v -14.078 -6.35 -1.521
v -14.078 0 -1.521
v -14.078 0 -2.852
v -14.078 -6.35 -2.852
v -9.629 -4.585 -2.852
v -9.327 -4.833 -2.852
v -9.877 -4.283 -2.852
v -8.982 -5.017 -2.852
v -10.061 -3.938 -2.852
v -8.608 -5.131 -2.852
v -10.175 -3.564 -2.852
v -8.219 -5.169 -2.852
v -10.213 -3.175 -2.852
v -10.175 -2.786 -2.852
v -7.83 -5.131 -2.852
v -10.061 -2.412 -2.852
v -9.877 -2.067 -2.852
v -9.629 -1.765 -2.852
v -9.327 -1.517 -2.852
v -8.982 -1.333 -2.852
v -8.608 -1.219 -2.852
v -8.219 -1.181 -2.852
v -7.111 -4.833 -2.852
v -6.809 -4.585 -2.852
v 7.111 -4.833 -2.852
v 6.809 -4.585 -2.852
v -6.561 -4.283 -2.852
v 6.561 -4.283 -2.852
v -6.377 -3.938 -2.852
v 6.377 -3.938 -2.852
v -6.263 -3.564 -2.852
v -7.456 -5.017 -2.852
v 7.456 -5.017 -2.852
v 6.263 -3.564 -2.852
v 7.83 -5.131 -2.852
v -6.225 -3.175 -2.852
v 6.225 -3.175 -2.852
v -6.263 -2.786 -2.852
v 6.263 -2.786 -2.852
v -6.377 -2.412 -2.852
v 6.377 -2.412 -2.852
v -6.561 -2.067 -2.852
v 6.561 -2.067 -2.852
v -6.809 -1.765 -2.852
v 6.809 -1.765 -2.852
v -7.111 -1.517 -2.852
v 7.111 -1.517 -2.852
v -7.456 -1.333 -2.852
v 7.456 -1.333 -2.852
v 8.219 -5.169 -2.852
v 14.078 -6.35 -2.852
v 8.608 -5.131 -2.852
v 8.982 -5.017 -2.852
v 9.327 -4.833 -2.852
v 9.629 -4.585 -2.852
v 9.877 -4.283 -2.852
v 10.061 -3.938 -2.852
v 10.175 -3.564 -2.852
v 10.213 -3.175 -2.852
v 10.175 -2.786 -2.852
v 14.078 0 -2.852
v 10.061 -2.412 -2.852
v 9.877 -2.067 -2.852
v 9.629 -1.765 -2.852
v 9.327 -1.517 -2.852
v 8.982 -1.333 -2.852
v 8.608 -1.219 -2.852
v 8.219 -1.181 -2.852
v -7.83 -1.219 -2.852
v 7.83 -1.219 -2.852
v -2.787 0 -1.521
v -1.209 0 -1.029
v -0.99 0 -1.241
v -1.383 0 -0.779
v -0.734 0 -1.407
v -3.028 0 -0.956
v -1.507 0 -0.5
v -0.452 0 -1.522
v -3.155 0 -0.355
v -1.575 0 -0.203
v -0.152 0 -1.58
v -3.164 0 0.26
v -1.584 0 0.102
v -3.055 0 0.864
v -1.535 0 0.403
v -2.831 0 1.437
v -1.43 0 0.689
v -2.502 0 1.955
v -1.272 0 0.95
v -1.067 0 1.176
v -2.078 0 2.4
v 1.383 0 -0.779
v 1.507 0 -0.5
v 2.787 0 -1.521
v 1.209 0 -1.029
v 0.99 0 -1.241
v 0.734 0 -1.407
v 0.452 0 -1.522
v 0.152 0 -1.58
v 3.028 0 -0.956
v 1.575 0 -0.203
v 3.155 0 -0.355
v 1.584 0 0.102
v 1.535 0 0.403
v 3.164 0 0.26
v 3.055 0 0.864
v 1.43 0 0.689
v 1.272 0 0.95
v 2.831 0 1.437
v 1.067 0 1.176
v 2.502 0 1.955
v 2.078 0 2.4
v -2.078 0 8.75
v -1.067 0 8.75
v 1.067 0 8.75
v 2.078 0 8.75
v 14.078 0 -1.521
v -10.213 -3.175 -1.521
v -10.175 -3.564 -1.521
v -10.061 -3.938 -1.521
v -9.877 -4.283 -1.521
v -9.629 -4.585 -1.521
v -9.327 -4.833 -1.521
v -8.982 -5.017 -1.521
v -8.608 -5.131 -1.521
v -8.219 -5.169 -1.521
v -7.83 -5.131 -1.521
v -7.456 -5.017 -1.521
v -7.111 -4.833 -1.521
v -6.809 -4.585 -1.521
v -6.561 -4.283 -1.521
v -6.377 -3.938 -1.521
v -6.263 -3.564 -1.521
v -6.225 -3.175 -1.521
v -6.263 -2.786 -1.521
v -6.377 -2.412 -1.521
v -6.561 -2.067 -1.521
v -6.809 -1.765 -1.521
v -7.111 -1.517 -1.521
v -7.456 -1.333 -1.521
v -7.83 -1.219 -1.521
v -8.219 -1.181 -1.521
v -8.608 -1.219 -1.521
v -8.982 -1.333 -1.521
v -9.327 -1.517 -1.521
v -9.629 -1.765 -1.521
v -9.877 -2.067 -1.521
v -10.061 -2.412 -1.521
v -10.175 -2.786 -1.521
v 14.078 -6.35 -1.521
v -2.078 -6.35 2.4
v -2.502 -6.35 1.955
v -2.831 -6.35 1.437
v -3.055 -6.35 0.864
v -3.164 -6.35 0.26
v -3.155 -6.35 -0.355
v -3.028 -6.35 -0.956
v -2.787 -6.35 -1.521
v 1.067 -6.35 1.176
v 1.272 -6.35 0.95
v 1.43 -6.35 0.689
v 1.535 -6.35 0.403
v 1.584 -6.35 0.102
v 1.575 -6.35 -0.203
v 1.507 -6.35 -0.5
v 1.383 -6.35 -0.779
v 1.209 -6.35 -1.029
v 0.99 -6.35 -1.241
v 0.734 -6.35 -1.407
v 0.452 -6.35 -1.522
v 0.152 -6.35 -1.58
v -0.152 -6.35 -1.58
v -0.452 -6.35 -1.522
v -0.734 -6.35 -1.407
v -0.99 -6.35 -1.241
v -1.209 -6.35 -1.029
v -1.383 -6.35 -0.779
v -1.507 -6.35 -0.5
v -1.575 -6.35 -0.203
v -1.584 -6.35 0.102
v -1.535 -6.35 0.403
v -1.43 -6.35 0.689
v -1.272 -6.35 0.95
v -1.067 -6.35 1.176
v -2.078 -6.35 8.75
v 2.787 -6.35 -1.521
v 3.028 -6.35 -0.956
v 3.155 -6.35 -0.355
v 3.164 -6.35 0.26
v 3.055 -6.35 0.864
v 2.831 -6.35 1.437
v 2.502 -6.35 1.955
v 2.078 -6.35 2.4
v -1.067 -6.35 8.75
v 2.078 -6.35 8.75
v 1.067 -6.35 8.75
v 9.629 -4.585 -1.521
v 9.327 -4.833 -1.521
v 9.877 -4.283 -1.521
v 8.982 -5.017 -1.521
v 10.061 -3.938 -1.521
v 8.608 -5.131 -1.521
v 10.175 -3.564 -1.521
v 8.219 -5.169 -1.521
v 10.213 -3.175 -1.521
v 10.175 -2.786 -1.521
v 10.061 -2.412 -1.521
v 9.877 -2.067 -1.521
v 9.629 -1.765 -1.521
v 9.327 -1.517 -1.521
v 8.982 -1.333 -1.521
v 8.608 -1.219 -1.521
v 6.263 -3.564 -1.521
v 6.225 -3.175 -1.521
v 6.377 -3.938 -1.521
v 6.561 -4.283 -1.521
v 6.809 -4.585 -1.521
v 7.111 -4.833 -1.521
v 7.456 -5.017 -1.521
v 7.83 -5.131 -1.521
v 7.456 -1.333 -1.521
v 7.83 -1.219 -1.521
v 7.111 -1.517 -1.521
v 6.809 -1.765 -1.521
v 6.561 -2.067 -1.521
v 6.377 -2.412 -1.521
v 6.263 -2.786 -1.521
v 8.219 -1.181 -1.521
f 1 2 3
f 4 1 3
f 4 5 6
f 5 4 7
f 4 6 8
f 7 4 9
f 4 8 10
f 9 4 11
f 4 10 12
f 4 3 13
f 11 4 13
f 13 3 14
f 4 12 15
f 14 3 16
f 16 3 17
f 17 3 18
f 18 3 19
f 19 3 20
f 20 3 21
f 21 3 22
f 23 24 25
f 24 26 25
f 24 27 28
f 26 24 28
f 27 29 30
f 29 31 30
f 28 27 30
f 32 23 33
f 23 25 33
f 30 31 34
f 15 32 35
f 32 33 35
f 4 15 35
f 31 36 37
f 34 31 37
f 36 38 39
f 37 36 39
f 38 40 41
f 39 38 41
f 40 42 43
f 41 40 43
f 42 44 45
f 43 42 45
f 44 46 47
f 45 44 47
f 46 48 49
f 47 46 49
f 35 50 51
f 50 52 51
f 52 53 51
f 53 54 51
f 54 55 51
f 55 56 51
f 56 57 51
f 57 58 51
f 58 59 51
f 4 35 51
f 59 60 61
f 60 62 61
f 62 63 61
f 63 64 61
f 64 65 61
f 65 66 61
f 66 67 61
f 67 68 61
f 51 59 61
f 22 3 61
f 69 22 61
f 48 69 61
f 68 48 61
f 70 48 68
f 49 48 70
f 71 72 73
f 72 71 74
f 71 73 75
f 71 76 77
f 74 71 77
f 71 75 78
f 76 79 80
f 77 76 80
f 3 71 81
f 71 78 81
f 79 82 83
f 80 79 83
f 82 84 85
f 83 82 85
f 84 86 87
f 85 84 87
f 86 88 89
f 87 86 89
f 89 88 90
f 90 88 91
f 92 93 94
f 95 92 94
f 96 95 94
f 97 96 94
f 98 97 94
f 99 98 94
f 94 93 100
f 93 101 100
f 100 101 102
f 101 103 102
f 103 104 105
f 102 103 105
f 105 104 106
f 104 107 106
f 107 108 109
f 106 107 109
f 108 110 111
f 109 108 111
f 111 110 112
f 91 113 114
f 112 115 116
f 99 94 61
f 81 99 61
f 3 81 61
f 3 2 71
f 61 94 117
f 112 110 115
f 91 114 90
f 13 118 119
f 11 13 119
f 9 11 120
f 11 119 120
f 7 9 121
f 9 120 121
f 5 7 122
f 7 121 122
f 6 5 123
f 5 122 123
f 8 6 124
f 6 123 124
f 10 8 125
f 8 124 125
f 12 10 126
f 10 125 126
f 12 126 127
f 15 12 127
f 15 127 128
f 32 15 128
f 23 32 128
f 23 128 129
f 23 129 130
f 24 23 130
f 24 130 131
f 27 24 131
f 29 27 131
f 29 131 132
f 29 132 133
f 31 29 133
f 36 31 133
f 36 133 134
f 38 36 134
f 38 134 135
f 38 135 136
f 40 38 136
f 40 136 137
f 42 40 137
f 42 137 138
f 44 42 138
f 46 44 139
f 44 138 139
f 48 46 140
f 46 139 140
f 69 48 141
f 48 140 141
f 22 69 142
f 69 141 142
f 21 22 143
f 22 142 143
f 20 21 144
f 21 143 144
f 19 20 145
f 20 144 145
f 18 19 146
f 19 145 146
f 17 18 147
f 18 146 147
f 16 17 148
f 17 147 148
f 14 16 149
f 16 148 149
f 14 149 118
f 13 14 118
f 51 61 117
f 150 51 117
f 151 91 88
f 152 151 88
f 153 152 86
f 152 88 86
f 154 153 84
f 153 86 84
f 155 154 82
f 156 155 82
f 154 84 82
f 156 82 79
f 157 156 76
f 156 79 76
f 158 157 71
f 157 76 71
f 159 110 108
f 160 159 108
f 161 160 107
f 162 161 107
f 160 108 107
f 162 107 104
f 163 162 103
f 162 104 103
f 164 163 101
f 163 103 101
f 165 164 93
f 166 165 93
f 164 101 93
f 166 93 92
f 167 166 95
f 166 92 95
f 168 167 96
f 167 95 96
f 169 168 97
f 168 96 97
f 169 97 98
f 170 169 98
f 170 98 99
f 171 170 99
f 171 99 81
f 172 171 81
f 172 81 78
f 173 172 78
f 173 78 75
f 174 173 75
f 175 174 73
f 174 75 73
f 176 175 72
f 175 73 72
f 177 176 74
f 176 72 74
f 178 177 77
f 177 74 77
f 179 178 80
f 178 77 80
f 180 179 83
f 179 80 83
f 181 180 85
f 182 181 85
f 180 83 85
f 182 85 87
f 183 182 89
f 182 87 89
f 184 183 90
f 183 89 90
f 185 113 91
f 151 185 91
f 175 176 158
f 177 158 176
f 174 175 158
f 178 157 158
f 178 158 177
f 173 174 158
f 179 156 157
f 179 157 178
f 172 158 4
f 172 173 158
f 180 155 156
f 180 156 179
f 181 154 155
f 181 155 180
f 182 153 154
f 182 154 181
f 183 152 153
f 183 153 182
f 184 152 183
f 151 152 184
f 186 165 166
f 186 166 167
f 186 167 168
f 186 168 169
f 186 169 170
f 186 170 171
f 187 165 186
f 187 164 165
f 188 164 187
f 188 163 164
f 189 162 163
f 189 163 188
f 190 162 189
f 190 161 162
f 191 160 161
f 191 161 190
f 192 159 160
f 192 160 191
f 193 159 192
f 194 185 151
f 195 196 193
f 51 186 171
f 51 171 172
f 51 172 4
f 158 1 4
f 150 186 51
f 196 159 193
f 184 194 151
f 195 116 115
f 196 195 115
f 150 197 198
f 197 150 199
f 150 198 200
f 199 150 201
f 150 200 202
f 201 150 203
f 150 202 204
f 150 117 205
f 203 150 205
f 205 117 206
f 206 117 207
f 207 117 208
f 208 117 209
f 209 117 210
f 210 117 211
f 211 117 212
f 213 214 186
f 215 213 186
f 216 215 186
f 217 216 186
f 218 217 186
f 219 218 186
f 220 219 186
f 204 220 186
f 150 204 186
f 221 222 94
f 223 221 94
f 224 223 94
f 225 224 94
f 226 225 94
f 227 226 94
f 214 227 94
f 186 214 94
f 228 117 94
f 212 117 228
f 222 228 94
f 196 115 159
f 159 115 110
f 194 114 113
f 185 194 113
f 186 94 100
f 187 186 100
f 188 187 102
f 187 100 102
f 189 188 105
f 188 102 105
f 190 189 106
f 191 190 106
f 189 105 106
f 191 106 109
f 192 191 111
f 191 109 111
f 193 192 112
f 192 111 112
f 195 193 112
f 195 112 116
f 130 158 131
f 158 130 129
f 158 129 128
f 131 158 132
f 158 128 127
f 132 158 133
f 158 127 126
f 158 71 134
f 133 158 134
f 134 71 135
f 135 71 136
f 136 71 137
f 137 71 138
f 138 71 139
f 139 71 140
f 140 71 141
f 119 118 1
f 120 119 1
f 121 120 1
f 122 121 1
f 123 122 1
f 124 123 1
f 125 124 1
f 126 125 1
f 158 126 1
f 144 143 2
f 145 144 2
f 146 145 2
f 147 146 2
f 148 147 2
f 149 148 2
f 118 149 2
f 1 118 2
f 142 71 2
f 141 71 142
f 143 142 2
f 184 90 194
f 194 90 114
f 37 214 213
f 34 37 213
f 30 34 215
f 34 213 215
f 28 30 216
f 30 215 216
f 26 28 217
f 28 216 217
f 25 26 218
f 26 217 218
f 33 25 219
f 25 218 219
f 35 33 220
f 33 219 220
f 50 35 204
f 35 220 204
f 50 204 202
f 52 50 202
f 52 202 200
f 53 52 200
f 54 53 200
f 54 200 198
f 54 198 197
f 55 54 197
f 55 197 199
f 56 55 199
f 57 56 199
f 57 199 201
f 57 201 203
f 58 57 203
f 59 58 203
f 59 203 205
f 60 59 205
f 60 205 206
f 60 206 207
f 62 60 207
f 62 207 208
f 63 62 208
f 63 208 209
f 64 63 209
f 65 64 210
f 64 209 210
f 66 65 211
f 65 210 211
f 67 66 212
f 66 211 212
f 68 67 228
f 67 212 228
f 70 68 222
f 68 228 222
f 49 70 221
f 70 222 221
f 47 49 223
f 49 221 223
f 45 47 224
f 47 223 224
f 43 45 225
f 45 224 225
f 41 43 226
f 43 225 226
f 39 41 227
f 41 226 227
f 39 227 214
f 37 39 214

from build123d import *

# Parameters (mm, degrees)
F1_DEPTH = 6.35
F4_D     = 3.9878


with BuildPart() as f1:
    # F0 (on Front) → F1 (new body)
    with BuildSketch(Plane.XZ):
        with BuildLine():
            ThreePointArc((-2.078402, 2.400181), (-1.600052, 2.742345), (-1.0668, 2.990412))
            Line((-1.0668, 2.990412), (-1.0668, 4.192946))
            Line((-1.0668, 4.192946), (-1.0668, 8.750181))
            Line((-1.0668, 8.750181), (-2.078402, 8.750181))
            Line((-2.078402, 8.750181), (-2.078402, 4.192946))
            Line((-2.078402, 4.192946), (-2.078402, 2.400181))
        make_face()
        with BuildLine():
            ThreePointArc((1.0668, 1.175625), (0, -1.5875), (-1.0668, 1.175625))
            Line((-1.0668, 1.175625), (-1.0668, 2.990412))
            ThreePointArc((-1.0668, 2.990412), (-1.600052, 2.742345), (-2.078402, 2.400181))
            ThreePointArc((-2.078402, 2.400181), (-3.12438, 0.564687), (-2.787067, -1.520817))
            ThreePointArc((-2.787067, -1.520817), (-2.194353, -2.294655), (-1.394812, -2.852214))
            Line((-1.394812, -2.852214), (1.394812, -2.852214))
            ThreePointArc((1.394812, -2.852214), (2.194353, -2.294655), (2.787067, -1.520817))
            ThreePointArc((2.787067, -1.520817), (3.12438, 0.564687), (2.078402, 2.400181))
            ThreePointArc((2.078402, 2.400181), (1.600052, 2.742345), (1.0668, 2.990412))
            Line((1.0668, 2.990412), (1.0668, 1.175625))
        make_face()
        with BuildLine():
            Line((1.0668, 4.192946), (1.0668, 2.990412))
            ThreePointArc((1.0668, 2.990412), (1.600052, 2.742345), (2.078402, 2.400181))
            Line((2.078402, 2.400181), (2.078402, 4.192946))
            Line((2.078402, 4.192946), (2.078402, 8.750181))
            Line((2.078402, 8.750181), (1.0668, 8.750181))
            Line((1.0668, 8.750181), (1.0668, 4.192946))
        make_face()
        with BuildLine():
            Line((14.078129, -1.520817), (2.787067, -1.520817))
            ThreePointArc((2.787067, -1.520817), (2.194353, -2.294655), (1.394812, -2.852214))
            Line((1.394812, -2.852214), (14.078129, -2.852214))
            Line((14.078129, -2.852214), (14.078129, -1.520817))
        make_face()
        with BuildLine():
            ThreePointArc((-1.394812, -2.852214), (-2.194353, -2.294655), (-2.787067, -1.520817))
            Line((-2.787067, -1.520817), (-14.078129, -1.520817))
            Line((-14.078129, -1.520817), (-14.078129, -2.852214))
            Line((-14.078129, -2.852214), (-1.394812, -2.852214))
        make_face()
    extrude(amount=F1_DEPTH)

    # F4 (through all)
    with Locations(Plane(origin=(0, 0, -2.852214), x_dir=(1, 0, 0), z_dir=(0, 0, -1))):
        with Locations((-8.219072, 3.175), (8.219072, 3.175)):
            Hole(F4_D / 2)


solid = f1.part
